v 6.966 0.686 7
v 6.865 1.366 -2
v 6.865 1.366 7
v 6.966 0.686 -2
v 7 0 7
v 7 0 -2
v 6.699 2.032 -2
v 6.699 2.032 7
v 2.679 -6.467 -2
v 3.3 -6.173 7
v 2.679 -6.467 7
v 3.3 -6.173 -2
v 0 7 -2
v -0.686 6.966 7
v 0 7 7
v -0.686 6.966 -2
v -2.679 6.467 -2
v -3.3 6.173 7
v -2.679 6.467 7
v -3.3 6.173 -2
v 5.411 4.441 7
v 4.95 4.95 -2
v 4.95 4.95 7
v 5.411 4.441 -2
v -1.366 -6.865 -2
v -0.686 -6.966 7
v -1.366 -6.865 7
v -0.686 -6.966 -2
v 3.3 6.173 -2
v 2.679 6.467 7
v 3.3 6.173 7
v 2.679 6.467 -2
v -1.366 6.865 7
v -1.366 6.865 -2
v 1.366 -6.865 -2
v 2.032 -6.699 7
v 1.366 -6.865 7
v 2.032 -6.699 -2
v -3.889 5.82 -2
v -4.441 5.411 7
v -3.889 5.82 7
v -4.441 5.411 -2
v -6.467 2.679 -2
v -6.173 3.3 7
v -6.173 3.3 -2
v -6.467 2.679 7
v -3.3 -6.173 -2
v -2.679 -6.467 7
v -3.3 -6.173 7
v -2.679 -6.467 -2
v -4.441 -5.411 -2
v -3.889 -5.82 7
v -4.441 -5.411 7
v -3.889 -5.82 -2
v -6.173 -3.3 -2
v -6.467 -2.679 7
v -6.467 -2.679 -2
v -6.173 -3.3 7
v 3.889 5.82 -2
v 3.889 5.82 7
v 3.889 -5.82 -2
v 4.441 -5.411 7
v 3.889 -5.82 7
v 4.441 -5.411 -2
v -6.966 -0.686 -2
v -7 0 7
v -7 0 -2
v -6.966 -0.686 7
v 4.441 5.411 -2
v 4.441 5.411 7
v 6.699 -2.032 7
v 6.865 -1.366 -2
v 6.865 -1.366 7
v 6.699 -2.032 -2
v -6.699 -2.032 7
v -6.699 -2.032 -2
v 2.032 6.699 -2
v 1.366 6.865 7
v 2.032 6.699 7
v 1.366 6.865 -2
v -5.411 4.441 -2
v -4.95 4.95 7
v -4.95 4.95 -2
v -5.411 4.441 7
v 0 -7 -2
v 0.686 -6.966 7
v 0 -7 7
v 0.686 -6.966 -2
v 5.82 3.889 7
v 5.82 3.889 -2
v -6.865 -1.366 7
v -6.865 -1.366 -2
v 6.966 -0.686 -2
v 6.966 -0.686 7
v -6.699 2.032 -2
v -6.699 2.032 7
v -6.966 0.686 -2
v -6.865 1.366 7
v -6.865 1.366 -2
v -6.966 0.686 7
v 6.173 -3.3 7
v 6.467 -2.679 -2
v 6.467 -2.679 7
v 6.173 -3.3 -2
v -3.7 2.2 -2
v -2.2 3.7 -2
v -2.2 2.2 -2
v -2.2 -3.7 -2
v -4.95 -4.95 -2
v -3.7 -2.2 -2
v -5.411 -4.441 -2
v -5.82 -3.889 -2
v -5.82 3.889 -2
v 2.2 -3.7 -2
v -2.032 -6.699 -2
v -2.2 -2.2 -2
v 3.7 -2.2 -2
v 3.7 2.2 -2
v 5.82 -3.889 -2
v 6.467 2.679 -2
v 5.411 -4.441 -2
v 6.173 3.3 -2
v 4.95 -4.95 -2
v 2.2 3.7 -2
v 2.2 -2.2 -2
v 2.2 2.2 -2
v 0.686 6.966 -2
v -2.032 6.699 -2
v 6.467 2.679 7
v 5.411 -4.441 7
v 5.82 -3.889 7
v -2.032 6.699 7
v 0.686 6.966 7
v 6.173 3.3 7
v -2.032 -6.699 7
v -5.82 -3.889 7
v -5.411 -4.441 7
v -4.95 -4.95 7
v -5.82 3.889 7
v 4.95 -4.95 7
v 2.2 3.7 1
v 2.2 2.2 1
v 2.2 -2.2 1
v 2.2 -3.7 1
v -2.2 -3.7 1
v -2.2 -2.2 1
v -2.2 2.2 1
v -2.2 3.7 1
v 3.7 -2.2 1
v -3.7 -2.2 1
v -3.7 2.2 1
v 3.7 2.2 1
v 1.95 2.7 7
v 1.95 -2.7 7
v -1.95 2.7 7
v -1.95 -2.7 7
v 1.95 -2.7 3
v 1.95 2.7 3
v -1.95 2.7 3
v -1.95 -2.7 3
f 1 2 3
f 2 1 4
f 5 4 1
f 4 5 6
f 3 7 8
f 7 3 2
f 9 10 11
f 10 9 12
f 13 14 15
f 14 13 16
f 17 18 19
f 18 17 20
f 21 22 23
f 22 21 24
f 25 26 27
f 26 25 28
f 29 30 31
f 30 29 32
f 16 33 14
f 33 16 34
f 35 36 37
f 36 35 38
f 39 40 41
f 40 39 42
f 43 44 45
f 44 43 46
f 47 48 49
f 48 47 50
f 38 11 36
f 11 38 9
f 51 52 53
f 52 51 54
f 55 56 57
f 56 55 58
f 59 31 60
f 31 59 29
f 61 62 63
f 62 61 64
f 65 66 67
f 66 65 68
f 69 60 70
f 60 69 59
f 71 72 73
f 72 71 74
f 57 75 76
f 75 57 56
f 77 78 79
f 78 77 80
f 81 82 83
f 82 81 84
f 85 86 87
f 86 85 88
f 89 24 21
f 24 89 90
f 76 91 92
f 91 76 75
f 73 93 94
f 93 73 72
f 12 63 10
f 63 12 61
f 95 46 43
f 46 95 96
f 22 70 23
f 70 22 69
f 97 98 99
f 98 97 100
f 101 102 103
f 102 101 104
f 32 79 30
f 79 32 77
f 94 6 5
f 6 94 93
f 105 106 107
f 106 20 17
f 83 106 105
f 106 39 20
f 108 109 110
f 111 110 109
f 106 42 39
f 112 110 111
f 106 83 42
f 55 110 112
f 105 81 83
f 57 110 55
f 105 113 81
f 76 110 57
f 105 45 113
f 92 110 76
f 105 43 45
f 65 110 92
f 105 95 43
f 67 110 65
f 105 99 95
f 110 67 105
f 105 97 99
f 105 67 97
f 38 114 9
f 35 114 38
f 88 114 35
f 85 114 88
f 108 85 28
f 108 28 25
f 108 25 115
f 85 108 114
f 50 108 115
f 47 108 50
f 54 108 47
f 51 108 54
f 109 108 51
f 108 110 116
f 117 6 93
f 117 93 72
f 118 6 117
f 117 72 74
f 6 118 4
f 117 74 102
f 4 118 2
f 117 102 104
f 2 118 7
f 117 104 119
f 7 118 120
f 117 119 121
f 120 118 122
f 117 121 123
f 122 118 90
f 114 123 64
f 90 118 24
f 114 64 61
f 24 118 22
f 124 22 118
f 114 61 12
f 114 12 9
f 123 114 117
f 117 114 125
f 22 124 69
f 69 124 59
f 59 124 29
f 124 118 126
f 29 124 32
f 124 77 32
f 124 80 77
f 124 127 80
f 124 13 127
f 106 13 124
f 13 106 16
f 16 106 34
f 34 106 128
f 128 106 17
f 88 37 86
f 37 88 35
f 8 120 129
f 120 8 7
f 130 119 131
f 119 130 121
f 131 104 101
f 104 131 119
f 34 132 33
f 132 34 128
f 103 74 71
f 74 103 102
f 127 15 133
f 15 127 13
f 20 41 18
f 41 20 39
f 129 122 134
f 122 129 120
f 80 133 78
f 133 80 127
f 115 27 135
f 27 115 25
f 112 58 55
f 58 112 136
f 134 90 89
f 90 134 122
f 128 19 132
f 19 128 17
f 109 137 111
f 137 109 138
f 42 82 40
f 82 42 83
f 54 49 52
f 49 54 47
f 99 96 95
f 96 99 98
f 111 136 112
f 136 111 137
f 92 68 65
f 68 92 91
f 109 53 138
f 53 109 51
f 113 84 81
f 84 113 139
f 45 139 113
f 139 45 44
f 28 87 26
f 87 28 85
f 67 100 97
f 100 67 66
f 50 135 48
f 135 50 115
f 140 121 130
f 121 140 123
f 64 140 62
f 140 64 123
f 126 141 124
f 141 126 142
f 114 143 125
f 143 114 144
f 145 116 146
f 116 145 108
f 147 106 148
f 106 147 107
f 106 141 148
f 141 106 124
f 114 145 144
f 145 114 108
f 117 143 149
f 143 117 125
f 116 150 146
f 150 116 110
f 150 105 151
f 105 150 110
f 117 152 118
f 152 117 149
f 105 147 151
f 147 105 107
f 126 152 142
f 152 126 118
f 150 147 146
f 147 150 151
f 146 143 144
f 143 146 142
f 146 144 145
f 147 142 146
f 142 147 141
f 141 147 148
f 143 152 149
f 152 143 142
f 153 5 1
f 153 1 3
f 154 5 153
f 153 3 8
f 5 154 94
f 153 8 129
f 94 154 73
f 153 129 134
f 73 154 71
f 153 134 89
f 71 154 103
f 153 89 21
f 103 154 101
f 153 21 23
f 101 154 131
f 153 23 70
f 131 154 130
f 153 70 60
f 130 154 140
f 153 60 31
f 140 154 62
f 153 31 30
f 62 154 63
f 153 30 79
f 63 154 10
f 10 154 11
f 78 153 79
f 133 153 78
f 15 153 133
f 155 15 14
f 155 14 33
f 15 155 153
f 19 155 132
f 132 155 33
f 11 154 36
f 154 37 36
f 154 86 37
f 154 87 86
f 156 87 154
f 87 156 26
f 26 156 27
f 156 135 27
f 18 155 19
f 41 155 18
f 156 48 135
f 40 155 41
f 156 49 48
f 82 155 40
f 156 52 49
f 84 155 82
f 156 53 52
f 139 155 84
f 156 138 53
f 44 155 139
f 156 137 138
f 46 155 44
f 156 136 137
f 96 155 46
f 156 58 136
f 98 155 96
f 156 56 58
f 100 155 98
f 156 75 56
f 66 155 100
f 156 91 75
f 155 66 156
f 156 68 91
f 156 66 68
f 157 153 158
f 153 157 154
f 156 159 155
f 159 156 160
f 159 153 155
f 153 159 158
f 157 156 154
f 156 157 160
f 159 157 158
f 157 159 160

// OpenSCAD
$fn=64;

shaft1Width=4;
shaft1Height=7;
tolerance1=0.4;
d1=14;
thickness1=4;
shaft1Double=true;

shaft2Width=3.7;
shaft2Height=5.2;
tolerance2=0.2;
d2=14;
thickness2=6;
shaft2Double=false;

centerThickness=2;
centerd=9;

union() {
    difference() {
        cylinder(h=thickness1, d=d1, center=true);
        cube(
            [shaft1Width+tolerance1, shaft1Height+tolerance1, thickness1],
            center=true
        );
        if (shaft1Double) {
            rotate([0, 0, 90]) {
                cube(
                    [shaft1Width+tolerance1, shaft1Height+tolerance1, thickness1],
                    center=true
                );
            }
        }
    }
    translate([0, 0, thickness1/2]) {
        cylinder(h=centerThickness, d=centerd, center=true);
    }
    translate([0, 0, thickness1/2+centerThickness]) {
        difference() {
            cylinder(h=thickness2, d=d2, center=true);
            cube(
                [shaft2Width+tolerance2, shaft2Height+tolerance2, thickness2],
                center=true
            );
            if (shaft2Double) {
                rotate([0, 0, 90]) {
                    cube(
                        [shaft2Width+tolerance2, shaft2Height+tolerance2, thickness2],
                        center=true
                    );
                }
            }
        }
    }
}
